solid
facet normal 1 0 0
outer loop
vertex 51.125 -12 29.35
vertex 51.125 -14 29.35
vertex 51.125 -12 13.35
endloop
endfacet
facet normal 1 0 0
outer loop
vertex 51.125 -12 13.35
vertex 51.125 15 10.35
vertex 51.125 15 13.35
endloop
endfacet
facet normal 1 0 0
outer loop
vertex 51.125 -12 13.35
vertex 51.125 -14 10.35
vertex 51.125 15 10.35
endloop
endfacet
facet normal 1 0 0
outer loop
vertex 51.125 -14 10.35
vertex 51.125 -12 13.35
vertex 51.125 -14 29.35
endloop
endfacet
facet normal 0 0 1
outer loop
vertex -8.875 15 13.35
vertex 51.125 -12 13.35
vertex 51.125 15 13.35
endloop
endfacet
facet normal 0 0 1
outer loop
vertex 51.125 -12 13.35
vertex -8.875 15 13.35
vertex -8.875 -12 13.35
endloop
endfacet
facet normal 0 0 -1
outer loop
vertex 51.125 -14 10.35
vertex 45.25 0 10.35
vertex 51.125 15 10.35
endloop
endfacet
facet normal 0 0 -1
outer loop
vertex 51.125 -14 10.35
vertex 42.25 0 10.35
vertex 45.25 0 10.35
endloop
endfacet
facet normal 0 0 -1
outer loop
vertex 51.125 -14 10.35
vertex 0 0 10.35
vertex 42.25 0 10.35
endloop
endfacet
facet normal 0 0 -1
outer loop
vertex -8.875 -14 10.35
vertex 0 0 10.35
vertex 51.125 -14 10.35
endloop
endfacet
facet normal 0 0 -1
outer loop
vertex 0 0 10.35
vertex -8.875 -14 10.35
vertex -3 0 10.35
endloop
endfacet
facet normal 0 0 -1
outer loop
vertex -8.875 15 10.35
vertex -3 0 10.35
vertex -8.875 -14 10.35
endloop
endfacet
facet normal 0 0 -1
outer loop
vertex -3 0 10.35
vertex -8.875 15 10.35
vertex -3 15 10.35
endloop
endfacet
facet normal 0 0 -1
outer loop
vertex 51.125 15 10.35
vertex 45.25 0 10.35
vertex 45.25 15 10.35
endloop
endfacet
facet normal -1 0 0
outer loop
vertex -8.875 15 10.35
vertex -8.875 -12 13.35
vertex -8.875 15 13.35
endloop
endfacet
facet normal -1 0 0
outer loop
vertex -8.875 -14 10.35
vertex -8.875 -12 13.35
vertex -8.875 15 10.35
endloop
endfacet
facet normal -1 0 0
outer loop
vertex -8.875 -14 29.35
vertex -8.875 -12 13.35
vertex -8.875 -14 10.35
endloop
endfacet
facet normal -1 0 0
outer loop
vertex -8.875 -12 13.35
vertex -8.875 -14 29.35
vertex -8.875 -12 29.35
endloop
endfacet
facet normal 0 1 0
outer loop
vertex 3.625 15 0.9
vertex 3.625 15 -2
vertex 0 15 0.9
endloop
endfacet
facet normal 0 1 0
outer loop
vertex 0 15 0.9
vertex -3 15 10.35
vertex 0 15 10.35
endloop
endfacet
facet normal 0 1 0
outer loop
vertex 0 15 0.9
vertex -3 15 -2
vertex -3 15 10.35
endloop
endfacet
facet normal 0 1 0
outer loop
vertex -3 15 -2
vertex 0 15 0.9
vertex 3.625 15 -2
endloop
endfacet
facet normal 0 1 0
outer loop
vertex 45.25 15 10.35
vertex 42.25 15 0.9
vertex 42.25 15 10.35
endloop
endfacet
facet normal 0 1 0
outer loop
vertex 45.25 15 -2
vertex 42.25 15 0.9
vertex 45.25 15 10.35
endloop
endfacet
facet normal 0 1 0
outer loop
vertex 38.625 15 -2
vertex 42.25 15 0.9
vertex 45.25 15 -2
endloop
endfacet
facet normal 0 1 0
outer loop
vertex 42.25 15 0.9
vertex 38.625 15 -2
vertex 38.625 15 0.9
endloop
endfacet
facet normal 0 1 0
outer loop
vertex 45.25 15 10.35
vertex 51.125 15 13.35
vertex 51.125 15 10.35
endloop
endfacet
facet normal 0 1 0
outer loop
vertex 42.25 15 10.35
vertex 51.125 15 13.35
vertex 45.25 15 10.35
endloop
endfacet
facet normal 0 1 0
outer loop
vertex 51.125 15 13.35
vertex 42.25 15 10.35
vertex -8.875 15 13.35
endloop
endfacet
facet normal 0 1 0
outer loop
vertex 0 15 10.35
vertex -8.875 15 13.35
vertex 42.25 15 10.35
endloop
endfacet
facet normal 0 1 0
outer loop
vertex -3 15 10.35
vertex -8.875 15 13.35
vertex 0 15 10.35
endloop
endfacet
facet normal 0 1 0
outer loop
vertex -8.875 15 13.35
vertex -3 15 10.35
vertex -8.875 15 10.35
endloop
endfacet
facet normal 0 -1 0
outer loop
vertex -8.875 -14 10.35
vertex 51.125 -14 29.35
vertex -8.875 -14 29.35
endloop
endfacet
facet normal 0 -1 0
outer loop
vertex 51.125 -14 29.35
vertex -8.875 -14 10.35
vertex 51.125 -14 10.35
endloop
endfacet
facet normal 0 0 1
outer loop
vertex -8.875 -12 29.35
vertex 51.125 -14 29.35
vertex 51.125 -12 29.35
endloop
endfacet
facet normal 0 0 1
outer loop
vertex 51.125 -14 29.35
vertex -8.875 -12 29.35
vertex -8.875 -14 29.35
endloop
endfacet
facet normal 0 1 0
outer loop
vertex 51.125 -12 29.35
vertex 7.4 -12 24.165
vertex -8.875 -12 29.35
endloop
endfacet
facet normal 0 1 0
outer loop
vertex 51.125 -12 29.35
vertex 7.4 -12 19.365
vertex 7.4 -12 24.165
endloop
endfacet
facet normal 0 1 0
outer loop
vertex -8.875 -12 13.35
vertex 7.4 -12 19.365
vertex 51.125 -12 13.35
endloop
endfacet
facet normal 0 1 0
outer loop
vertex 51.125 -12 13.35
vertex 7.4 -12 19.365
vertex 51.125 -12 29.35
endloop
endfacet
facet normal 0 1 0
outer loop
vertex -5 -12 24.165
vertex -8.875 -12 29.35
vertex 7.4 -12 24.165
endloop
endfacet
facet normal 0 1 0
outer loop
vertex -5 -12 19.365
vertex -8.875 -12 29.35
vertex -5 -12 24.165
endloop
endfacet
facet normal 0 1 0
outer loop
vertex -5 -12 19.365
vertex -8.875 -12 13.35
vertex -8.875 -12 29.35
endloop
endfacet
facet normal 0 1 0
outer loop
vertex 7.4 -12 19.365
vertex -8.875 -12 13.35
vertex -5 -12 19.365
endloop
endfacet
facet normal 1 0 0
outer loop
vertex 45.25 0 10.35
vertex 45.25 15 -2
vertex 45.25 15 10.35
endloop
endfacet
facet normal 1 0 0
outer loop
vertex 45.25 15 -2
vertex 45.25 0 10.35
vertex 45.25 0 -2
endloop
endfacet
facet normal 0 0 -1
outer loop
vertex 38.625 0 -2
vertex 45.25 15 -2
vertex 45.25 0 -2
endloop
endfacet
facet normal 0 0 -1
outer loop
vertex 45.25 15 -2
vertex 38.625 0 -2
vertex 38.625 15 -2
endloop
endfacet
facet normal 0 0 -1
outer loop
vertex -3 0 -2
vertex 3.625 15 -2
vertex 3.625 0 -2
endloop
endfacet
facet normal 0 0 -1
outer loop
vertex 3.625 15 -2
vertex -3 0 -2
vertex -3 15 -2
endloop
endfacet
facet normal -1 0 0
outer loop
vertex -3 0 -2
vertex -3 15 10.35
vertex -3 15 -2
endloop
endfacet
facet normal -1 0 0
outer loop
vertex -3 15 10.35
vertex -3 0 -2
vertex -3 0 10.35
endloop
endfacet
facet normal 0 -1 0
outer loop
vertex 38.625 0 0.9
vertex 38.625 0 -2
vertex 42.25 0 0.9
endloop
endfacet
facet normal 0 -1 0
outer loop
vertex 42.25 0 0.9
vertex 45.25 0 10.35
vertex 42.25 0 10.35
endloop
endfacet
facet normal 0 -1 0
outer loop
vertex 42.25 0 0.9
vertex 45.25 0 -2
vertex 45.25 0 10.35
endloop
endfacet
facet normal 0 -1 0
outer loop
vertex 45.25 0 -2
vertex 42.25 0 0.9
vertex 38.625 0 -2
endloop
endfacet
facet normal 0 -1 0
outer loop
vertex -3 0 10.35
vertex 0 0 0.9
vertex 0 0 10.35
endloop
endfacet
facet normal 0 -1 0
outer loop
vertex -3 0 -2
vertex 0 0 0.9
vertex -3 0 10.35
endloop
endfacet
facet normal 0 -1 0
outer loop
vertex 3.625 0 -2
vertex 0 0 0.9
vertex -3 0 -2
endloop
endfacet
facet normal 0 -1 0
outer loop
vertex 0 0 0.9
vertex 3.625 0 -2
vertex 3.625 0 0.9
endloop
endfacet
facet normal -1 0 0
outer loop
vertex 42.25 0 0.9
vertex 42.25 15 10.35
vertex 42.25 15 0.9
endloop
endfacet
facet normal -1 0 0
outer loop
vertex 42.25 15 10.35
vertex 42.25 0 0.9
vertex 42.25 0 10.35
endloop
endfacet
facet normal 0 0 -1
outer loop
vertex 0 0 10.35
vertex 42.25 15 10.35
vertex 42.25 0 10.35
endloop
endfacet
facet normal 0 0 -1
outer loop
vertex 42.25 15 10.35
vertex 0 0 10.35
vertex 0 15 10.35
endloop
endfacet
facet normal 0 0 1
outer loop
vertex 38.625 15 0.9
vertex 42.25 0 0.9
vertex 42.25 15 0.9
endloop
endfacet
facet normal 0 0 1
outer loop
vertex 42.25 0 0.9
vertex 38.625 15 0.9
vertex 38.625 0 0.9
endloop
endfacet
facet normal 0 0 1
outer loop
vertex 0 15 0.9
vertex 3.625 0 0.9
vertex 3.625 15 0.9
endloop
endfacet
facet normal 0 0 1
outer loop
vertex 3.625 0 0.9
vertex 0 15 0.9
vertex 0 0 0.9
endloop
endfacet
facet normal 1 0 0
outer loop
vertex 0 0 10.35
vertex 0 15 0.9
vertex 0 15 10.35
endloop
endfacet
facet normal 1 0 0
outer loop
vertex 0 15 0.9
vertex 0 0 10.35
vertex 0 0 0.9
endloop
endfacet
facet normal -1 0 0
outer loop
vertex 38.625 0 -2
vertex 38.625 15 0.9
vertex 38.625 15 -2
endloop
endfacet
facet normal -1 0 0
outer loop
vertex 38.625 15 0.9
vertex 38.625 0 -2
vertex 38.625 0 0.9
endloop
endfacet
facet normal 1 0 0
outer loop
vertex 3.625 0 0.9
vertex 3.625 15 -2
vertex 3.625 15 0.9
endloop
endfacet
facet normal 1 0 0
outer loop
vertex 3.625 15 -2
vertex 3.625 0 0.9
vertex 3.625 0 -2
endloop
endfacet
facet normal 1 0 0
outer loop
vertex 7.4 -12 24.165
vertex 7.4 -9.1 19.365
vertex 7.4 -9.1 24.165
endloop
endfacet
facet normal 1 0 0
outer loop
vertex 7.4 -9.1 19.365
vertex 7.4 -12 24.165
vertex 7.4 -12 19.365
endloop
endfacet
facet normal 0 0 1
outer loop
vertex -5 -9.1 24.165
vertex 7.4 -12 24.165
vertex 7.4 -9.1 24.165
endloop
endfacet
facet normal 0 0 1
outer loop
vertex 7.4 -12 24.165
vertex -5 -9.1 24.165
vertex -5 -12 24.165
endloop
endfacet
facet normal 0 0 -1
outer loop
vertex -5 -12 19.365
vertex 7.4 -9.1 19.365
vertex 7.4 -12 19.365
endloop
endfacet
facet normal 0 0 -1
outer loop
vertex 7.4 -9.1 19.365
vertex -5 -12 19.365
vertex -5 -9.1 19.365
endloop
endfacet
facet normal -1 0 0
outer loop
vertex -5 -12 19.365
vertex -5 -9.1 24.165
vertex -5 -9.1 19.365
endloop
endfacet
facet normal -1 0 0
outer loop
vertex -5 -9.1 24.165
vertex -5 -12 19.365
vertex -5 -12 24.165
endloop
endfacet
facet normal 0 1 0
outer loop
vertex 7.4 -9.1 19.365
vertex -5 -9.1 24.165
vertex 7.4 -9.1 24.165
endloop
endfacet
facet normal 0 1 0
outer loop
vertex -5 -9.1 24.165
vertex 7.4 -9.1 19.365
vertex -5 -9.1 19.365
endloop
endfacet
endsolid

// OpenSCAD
mirror([0,0,0]){
union(){
difference(){
union(){
translate([((60-42.25)/2)*-1,15-29,10.35])
cube([60,29,3]);

translate([((60-42.25)/2)*-1,15-29,10.35])
cube([60,2,19]);
translate([-3,0,-2])
cube([42.25+6,15,10.35+3+2]);

}
translate([0,0,0.9])
cube([42.25,15,9.45]);
translate([(42.25-35)/2,0,-2])
cube([35,15,10.356]);
}
translate([-5,-12,20-6.635+6])
cube([12.4,2.9,4.8]);
}
}
